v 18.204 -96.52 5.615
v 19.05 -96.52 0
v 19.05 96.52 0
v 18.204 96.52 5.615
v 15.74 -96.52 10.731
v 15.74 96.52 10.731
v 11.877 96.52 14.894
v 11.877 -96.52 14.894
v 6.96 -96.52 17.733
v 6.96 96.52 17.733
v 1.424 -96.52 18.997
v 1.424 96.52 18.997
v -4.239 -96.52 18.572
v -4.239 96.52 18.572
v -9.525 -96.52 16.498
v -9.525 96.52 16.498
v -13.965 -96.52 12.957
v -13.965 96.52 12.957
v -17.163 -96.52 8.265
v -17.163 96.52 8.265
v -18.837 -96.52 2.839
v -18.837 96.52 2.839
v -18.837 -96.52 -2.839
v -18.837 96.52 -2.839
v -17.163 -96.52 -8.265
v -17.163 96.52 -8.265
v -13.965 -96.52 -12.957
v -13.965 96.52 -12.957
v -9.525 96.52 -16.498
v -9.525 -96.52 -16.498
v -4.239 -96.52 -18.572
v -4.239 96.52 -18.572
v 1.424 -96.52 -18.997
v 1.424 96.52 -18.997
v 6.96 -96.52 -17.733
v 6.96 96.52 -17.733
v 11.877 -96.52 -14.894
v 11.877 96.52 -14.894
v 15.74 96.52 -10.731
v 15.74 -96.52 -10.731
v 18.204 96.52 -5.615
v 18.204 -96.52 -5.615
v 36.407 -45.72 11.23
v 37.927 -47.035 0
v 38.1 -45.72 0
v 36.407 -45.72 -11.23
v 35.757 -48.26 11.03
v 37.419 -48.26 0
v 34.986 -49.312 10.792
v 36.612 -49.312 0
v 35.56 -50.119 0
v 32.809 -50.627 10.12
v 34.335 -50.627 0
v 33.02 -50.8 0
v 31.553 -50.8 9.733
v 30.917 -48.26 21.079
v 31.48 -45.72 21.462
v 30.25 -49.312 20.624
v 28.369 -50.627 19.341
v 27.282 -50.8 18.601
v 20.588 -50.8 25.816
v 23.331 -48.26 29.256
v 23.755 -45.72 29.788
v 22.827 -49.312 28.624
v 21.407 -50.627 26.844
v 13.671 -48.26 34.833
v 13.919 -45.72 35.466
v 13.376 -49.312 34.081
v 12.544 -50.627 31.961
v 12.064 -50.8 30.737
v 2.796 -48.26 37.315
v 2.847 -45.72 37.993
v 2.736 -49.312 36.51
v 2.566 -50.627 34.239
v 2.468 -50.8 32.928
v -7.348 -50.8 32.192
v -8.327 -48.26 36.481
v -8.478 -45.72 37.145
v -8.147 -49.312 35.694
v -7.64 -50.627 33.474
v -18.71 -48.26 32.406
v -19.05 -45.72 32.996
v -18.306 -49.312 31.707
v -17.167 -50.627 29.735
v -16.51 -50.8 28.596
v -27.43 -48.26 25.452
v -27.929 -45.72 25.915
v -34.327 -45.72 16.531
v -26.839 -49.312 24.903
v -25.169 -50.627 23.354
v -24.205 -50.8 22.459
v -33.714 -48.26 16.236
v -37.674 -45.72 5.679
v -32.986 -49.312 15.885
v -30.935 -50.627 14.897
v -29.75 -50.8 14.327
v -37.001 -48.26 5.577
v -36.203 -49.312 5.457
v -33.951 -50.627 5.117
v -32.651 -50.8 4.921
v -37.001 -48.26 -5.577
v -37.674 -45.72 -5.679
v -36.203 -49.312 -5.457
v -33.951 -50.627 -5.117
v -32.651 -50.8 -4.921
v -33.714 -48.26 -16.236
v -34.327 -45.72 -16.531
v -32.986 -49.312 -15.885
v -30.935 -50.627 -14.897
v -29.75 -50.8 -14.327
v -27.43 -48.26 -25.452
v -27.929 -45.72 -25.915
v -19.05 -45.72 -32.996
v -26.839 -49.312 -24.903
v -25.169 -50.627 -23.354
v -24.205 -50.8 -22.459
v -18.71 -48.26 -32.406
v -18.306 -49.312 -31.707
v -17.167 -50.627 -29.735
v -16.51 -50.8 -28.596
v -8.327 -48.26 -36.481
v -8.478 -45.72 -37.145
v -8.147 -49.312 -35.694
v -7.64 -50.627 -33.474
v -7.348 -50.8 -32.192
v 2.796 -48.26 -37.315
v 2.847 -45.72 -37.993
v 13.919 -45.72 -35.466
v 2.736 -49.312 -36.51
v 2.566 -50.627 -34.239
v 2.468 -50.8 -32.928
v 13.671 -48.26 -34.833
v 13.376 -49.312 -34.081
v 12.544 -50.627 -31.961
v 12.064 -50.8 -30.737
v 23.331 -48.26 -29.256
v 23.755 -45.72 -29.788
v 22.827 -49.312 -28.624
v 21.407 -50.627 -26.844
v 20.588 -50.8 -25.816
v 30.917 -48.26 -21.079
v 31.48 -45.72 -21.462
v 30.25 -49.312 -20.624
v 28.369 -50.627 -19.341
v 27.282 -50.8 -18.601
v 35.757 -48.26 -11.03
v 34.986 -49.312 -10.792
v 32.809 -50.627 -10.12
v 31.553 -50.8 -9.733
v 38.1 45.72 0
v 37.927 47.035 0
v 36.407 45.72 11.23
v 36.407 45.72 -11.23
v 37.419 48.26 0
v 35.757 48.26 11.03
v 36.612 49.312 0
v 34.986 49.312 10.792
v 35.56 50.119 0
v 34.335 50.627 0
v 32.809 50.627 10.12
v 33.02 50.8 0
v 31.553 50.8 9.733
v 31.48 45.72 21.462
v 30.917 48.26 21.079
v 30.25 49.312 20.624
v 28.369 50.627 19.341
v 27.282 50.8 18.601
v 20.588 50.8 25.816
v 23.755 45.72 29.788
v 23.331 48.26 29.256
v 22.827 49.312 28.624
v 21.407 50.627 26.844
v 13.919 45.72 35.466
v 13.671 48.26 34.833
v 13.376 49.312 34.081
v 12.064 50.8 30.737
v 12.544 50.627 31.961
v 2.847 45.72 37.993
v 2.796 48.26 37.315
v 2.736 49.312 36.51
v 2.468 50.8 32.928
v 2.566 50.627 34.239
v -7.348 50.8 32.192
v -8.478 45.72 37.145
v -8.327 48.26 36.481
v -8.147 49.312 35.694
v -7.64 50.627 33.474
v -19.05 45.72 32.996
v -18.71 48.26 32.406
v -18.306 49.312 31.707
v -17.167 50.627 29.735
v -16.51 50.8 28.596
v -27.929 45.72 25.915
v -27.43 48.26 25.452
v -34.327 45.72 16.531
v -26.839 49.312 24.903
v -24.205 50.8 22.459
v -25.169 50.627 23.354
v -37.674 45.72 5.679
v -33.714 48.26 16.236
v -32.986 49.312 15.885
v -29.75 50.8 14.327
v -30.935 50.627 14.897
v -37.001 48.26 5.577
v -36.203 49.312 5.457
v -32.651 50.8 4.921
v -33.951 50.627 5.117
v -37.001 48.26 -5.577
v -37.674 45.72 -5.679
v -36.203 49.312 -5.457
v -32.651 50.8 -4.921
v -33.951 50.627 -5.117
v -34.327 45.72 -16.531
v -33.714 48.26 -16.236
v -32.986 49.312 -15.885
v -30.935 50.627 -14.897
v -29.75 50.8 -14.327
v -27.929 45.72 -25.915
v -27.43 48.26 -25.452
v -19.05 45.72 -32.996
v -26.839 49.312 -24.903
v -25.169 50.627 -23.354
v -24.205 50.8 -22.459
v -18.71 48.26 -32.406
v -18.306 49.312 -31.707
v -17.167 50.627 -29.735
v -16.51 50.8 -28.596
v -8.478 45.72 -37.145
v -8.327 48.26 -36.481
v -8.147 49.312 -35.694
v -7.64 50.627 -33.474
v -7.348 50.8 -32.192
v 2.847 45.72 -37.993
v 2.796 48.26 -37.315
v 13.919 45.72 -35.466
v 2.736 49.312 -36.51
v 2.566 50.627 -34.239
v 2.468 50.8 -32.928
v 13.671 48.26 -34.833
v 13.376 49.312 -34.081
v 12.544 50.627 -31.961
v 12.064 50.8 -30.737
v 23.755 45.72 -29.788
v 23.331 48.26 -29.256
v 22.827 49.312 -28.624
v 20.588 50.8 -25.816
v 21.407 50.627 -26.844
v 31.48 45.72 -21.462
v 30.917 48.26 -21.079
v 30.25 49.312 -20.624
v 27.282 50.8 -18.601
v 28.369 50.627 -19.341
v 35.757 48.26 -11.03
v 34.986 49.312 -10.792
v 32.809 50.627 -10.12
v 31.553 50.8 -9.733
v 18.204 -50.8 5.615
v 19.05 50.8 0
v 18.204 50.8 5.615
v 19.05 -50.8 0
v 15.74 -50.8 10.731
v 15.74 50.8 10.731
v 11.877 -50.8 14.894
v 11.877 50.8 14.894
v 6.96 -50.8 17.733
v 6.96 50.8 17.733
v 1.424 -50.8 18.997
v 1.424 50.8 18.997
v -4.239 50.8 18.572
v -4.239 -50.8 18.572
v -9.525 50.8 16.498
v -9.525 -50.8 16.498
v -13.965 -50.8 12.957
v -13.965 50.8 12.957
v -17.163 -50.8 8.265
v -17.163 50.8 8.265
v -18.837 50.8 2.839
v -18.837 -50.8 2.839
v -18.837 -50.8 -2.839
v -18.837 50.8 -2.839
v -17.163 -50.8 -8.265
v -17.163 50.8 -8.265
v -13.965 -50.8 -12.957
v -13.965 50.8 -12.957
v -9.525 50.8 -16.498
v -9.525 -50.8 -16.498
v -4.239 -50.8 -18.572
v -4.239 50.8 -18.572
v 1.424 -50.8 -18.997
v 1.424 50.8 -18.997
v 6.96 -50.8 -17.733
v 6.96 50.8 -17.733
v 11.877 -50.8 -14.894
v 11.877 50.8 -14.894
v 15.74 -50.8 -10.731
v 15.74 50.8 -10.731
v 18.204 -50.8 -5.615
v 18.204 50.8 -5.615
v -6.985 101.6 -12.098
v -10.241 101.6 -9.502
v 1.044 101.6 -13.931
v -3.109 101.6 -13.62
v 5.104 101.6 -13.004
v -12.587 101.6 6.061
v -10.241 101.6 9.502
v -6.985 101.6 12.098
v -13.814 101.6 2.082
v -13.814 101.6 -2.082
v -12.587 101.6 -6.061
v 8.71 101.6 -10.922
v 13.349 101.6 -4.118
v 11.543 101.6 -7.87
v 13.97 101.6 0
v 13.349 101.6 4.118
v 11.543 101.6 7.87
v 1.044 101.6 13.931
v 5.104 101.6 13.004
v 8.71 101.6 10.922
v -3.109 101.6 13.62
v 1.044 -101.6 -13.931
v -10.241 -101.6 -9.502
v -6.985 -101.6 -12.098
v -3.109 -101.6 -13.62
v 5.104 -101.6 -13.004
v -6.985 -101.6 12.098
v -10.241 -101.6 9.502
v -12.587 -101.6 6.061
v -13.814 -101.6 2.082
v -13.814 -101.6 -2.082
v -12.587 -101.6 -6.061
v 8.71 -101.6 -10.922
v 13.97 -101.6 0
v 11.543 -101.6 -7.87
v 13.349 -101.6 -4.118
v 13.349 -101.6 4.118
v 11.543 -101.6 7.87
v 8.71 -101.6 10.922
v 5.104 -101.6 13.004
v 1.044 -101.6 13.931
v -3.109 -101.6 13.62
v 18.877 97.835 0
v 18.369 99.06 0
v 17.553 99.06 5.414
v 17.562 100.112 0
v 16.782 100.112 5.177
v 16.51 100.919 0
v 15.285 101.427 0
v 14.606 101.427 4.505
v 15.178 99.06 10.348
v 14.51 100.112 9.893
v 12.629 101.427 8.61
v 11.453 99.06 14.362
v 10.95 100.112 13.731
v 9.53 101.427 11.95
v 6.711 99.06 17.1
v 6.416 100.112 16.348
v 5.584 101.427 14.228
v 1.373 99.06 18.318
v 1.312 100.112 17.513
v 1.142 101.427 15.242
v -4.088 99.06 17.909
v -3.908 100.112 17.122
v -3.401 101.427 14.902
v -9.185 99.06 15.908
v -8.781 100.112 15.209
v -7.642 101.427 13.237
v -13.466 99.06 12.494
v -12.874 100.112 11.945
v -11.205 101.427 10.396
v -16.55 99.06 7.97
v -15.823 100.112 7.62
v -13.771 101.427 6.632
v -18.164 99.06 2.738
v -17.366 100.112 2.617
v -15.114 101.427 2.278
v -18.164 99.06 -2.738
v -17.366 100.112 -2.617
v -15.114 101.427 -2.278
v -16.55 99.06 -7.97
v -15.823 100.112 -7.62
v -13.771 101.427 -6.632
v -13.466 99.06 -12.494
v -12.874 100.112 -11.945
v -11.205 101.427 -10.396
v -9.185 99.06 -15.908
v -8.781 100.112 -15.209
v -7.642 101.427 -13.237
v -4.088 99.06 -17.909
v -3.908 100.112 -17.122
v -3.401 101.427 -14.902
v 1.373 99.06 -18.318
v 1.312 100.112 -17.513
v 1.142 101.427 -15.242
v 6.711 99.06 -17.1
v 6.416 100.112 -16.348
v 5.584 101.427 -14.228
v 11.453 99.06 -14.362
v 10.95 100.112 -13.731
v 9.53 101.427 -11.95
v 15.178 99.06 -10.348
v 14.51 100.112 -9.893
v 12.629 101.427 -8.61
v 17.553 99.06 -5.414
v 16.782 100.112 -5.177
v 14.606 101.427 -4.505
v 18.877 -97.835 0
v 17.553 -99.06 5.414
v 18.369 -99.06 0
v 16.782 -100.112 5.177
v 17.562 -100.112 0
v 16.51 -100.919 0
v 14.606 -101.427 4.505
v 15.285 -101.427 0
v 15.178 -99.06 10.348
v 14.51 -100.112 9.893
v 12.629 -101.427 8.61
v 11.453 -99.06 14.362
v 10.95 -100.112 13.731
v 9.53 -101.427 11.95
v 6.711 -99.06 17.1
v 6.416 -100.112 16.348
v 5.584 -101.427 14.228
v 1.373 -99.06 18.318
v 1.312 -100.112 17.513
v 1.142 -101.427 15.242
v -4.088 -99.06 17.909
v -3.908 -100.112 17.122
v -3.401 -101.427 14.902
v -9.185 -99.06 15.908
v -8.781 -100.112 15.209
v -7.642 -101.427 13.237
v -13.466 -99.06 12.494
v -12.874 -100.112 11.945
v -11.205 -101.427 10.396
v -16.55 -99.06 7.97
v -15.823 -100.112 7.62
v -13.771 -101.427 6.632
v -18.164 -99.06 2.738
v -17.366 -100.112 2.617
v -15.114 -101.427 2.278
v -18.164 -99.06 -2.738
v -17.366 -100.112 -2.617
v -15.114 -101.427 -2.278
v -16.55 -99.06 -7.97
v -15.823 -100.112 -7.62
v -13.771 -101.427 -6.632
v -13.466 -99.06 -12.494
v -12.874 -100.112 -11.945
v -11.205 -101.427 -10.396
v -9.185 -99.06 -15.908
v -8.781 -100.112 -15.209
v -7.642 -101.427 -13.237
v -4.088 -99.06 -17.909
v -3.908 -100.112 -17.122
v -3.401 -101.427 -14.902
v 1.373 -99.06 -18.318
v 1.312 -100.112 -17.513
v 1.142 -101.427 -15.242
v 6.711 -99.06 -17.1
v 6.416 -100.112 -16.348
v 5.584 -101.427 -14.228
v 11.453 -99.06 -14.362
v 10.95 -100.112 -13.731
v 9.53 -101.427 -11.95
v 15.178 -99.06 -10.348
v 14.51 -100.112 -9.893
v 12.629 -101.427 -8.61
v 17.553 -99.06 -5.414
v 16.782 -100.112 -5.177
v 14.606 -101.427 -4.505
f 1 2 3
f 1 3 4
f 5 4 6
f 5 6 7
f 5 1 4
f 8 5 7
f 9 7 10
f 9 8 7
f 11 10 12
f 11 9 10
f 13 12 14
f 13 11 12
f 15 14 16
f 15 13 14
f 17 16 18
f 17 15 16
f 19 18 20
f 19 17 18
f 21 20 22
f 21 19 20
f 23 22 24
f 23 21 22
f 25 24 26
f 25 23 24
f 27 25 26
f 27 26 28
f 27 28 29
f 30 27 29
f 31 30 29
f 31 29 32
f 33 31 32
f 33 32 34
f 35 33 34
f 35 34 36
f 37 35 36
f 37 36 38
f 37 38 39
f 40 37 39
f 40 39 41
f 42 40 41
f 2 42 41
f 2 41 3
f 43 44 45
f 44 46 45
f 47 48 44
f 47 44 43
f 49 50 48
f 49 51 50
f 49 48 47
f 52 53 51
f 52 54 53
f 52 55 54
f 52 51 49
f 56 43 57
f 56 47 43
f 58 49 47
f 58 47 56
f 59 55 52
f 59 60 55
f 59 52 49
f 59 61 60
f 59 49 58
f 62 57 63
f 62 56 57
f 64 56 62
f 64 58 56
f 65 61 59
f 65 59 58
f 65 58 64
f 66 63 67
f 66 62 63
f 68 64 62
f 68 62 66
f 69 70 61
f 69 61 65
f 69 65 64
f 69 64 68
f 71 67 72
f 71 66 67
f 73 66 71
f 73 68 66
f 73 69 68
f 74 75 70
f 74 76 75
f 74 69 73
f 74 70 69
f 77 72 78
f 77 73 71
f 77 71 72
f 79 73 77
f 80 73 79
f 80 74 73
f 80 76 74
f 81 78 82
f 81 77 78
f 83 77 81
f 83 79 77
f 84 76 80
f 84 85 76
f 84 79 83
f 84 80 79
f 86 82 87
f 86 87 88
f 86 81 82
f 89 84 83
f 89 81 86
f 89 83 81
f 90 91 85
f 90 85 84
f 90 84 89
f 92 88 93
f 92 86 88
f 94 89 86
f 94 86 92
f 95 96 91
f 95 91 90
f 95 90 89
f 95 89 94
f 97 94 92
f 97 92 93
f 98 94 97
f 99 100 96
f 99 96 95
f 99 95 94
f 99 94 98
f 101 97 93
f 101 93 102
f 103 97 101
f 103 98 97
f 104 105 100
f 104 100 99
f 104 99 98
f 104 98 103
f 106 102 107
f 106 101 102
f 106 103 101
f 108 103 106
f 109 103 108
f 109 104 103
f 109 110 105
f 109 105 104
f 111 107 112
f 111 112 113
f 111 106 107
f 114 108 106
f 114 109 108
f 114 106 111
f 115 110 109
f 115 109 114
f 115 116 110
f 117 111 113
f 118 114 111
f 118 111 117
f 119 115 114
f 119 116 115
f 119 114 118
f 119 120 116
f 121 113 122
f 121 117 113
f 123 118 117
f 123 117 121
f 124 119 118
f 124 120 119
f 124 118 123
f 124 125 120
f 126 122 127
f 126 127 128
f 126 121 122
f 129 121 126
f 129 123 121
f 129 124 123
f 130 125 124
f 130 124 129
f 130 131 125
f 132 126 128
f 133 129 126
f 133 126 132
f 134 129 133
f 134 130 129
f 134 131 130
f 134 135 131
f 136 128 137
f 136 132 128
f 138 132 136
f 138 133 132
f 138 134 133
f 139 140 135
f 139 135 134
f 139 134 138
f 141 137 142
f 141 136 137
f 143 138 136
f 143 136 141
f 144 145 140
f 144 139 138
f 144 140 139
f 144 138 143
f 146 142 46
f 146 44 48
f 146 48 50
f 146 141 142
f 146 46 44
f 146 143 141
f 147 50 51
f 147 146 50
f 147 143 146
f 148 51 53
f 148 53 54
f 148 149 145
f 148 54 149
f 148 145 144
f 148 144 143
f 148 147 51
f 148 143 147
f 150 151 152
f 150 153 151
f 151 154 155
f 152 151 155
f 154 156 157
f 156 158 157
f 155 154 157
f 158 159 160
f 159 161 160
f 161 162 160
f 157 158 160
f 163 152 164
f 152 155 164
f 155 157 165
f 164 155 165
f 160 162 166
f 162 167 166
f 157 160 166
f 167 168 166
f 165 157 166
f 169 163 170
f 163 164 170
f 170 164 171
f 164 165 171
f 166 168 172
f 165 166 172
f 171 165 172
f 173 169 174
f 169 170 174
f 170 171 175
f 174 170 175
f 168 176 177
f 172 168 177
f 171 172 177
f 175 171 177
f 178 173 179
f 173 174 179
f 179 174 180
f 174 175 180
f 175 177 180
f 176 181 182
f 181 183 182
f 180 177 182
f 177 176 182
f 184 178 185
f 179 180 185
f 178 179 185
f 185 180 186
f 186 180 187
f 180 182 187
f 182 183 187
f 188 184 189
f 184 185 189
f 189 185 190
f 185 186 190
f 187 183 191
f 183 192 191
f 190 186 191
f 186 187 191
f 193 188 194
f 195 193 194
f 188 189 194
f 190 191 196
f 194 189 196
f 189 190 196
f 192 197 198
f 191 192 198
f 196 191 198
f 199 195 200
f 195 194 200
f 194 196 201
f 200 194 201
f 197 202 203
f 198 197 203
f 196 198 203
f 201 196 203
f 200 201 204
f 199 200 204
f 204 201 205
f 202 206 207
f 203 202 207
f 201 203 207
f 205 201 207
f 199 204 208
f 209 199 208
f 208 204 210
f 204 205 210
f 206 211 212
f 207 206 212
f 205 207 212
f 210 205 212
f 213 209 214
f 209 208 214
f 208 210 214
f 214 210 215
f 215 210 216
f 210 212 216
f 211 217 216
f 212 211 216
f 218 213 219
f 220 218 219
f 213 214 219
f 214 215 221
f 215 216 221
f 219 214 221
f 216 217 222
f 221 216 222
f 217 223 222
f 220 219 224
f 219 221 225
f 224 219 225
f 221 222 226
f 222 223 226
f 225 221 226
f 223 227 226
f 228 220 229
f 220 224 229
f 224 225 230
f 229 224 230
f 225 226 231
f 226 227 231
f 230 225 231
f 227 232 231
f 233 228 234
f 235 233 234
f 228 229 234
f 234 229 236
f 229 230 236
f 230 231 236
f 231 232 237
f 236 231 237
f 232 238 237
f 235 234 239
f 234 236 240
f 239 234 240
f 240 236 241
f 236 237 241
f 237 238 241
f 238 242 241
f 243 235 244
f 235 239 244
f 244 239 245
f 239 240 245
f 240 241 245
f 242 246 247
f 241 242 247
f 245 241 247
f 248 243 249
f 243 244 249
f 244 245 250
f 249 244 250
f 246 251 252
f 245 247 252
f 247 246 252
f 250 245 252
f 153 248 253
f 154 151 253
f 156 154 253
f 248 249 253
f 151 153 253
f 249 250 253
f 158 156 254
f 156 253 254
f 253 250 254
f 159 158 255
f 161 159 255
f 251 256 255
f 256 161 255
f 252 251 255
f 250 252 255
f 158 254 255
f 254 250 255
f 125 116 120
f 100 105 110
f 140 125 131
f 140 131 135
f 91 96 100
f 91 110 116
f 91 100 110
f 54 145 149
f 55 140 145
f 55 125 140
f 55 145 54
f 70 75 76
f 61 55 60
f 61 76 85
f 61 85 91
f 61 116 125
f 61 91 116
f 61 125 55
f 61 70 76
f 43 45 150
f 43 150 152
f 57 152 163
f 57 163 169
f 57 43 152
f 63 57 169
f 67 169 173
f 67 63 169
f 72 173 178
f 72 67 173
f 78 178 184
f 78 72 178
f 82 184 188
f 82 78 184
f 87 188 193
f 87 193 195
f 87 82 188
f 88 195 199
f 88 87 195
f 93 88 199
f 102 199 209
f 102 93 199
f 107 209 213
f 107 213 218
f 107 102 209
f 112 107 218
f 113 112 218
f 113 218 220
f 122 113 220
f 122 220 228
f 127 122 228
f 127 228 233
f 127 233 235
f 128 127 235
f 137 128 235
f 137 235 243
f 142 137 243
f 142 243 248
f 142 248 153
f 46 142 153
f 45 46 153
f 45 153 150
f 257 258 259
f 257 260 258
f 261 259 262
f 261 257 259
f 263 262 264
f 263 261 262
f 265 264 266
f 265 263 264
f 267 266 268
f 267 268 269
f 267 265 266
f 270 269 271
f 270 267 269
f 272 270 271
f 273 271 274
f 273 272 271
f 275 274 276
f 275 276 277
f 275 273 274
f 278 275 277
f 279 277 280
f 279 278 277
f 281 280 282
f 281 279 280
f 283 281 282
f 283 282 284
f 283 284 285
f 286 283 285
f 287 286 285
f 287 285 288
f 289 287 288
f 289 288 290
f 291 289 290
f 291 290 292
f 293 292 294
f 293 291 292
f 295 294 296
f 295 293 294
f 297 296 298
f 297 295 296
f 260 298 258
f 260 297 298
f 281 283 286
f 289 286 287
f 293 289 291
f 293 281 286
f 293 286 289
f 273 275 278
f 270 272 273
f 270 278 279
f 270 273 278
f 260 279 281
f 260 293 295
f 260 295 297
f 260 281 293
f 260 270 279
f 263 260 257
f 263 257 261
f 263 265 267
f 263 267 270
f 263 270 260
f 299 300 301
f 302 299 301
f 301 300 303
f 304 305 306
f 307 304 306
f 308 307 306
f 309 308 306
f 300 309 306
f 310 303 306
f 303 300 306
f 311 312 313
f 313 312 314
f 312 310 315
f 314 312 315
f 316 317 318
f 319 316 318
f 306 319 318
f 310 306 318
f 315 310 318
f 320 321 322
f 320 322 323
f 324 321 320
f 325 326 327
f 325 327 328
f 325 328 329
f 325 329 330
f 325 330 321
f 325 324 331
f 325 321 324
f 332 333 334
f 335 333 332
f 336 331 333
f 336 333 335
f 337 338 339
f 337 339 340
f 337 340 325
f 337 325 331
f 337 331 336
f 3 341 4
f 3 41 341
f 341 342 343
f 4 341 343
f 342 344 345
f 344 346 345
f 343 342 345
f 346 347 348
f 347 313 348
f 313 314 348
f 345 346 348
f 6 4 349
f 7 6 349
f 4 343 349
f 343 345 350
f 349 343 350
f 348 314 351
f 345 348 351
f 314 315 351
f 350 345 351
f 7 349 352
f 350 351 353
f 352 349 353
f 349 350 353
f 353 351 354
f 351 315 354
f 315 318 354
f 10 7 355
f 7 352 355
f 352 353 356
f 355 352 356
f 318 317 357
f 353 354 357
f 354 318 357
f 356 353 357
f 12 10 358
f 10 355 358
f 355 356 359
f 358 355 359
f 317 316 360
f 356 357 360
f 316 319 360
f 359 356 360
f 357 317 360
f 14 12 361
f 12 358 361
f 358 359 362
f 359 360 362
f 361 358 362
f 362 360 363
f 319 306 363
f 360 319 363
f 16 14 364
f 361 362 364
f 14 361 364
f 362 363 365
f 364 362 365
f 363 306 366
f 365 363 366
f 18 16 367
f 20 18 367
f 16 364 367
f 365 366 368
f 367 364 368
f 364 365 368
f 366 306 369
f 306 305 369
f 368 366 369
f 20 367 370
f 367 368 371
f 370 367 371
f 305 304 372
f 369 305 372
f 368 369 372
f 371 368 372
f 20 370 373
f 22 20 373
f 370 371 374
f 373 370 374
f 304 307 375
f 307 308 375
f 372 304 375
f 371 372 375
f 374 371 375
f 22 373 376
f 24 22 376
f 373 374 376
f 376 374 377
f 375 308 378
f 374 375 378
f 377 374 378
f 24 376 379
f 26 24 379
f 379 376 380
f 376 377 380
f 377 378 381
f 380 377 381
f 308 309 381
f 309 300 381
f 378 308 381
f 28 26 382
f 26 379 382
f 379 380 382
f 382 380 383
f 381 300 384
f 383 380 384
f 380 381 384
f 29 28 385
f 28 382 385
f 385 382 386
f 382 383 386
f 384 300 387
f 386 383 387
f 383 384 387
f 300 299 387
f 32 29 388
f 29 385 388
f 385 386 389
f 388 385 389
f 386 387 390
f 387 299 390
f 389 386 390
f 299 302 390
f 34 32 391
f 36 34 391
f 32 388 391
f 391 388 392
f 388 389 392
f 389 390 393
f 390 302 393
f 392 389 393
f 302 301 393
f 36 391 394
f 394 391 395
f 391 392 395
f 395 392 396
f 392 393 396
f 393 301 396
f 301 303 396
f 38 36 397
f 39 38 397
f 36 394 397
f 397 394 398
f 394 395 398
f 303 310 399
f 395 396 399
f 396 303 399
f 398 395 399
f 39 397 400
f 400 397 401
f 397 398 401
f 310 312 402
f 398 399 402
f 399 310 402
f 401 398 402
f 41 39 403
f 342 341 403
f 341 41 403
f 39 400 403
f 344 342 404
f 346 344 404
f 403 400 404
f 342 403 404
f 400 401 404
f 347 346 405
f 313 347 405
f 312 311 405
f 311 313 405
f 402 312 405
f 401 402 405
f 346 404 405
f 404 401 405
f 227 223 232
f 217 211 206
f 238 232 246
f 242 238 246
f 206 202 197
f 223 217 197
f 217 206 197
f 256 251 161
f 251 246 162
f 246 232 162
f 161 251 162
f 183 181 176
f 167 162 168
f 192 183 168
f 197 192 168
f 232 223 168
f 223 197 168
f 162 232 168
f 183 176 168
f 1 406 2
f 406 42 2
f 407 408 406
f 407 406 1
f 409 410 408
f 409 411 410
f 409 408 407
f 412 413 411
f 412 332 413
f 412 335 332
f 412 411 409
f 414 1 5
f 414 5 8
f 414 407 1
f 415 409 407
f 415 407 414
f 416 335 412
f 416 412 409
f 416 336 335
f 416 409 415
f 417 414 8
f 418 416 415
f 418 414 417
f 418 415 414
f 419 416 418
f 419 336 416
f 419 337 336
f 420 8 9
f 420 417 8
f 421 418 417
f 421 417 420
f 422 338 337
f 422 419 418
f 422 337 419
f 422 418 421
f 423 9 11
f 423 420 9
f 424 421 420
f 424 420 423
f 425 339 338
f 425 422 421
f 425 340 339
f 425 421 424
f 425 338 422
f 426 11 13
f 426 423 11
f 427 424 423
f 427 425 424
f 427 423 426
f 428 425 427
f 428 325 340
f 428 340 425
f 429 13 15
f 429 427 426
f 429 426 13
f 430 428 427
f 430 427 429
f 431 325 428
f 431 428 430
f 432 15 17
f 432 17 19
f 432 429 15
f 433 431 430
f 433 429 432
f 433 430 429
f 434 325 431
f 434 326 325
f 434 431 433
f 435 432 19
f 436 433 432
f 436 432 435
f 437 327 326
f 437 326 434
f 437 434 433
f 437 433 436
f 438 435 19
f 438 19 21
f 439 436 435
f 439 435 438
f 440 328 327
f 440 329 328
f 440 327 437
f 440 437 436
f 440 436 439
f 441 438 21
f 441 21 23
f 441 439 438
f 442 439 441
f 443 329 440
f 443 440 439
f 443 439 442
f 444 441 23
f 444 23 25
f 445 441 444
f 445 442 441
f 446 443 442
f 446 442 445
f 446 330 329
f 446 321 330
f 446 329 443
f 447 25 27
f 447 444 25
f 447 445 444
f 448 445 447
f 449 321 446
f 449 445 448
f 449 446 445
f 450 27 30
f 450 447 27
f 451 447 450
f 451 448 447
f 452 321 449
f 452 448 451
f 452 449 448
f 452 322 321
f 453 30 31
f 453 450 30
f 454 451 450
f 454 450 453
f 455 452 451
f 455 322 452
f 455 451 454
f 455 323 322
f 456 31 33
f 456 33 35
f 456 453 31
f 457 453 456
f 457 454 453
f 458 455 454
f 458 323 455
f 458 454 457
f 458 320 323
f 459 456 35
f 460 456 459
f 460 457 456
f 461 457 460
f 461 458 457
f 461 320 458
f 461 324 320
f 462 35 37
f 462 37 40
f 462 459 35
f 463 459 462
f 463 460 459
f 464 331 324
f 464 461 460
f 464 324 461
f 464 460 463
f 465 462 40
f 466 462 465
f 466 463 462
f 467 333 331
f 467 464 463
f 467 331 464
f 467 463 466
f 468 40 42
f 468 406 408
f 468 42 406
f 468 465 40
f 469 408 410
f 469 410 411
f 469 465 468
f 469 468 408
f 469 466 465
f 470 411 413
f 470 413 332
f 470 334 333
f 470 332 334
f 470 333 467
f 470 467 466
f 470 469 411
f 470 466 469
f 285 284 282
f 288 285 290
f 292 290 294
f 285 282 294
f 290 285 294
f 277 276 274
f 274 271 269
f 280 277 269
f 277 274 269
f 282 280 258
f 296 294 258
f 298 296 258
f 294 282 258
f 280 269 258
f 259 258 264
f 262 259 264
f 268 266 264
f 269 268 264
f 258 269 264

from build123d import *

# Parameters (mm, degrees)
F1_R     = 19.05
F2_DEPTH = 50.8
F0_R     = 38.1
F3_DEPTH = 101.6
F4_R     = 5.08
F5_R     = 5.08


with BuildPart() as f2:
    # F1 (on Front) → F2 (new body, symmetric)
    with BuildSketch(Plane.XZ):
        Circle(F1_R)
    extrude(amount=F2_DEPTH, both=True)


with BuildPart() as f2b:
    # F0 (on Front) → F2, piece 2 (new body, symmetric)
    with BuildSketch(Plane.XZ):
        Circle(F0_R)
    extrude(amount=F2_DEPTH, both=True)

    # F4
    f4_edges = [f2b.edges().sort_by_distance(p)[0] for p in [
        (-38.1, -50.8, 0),
        (-38.1, 50.8, 0),
    ]]
    fillet(f4_edges, radius=F4_R)


with BuildPart() as f3:
    # F1 (on Front) → F3 (new body, symmetric)
    with BuildSketch(Plane.XZ):
        Circle(F1_R)
    extrude(amount=F3_DEPTH, both=True)

    # F5
    f5_edges = [f3.edges().sort_by_distance(p)[0] for p in [
        (-19.05, 101.6, 0),
        (-19.05, -101.6, 0),
    ]]
    fillet(f5_edges, radius=F5_R)


solid = Compound([f2.part, f2b.part, f3.part])
